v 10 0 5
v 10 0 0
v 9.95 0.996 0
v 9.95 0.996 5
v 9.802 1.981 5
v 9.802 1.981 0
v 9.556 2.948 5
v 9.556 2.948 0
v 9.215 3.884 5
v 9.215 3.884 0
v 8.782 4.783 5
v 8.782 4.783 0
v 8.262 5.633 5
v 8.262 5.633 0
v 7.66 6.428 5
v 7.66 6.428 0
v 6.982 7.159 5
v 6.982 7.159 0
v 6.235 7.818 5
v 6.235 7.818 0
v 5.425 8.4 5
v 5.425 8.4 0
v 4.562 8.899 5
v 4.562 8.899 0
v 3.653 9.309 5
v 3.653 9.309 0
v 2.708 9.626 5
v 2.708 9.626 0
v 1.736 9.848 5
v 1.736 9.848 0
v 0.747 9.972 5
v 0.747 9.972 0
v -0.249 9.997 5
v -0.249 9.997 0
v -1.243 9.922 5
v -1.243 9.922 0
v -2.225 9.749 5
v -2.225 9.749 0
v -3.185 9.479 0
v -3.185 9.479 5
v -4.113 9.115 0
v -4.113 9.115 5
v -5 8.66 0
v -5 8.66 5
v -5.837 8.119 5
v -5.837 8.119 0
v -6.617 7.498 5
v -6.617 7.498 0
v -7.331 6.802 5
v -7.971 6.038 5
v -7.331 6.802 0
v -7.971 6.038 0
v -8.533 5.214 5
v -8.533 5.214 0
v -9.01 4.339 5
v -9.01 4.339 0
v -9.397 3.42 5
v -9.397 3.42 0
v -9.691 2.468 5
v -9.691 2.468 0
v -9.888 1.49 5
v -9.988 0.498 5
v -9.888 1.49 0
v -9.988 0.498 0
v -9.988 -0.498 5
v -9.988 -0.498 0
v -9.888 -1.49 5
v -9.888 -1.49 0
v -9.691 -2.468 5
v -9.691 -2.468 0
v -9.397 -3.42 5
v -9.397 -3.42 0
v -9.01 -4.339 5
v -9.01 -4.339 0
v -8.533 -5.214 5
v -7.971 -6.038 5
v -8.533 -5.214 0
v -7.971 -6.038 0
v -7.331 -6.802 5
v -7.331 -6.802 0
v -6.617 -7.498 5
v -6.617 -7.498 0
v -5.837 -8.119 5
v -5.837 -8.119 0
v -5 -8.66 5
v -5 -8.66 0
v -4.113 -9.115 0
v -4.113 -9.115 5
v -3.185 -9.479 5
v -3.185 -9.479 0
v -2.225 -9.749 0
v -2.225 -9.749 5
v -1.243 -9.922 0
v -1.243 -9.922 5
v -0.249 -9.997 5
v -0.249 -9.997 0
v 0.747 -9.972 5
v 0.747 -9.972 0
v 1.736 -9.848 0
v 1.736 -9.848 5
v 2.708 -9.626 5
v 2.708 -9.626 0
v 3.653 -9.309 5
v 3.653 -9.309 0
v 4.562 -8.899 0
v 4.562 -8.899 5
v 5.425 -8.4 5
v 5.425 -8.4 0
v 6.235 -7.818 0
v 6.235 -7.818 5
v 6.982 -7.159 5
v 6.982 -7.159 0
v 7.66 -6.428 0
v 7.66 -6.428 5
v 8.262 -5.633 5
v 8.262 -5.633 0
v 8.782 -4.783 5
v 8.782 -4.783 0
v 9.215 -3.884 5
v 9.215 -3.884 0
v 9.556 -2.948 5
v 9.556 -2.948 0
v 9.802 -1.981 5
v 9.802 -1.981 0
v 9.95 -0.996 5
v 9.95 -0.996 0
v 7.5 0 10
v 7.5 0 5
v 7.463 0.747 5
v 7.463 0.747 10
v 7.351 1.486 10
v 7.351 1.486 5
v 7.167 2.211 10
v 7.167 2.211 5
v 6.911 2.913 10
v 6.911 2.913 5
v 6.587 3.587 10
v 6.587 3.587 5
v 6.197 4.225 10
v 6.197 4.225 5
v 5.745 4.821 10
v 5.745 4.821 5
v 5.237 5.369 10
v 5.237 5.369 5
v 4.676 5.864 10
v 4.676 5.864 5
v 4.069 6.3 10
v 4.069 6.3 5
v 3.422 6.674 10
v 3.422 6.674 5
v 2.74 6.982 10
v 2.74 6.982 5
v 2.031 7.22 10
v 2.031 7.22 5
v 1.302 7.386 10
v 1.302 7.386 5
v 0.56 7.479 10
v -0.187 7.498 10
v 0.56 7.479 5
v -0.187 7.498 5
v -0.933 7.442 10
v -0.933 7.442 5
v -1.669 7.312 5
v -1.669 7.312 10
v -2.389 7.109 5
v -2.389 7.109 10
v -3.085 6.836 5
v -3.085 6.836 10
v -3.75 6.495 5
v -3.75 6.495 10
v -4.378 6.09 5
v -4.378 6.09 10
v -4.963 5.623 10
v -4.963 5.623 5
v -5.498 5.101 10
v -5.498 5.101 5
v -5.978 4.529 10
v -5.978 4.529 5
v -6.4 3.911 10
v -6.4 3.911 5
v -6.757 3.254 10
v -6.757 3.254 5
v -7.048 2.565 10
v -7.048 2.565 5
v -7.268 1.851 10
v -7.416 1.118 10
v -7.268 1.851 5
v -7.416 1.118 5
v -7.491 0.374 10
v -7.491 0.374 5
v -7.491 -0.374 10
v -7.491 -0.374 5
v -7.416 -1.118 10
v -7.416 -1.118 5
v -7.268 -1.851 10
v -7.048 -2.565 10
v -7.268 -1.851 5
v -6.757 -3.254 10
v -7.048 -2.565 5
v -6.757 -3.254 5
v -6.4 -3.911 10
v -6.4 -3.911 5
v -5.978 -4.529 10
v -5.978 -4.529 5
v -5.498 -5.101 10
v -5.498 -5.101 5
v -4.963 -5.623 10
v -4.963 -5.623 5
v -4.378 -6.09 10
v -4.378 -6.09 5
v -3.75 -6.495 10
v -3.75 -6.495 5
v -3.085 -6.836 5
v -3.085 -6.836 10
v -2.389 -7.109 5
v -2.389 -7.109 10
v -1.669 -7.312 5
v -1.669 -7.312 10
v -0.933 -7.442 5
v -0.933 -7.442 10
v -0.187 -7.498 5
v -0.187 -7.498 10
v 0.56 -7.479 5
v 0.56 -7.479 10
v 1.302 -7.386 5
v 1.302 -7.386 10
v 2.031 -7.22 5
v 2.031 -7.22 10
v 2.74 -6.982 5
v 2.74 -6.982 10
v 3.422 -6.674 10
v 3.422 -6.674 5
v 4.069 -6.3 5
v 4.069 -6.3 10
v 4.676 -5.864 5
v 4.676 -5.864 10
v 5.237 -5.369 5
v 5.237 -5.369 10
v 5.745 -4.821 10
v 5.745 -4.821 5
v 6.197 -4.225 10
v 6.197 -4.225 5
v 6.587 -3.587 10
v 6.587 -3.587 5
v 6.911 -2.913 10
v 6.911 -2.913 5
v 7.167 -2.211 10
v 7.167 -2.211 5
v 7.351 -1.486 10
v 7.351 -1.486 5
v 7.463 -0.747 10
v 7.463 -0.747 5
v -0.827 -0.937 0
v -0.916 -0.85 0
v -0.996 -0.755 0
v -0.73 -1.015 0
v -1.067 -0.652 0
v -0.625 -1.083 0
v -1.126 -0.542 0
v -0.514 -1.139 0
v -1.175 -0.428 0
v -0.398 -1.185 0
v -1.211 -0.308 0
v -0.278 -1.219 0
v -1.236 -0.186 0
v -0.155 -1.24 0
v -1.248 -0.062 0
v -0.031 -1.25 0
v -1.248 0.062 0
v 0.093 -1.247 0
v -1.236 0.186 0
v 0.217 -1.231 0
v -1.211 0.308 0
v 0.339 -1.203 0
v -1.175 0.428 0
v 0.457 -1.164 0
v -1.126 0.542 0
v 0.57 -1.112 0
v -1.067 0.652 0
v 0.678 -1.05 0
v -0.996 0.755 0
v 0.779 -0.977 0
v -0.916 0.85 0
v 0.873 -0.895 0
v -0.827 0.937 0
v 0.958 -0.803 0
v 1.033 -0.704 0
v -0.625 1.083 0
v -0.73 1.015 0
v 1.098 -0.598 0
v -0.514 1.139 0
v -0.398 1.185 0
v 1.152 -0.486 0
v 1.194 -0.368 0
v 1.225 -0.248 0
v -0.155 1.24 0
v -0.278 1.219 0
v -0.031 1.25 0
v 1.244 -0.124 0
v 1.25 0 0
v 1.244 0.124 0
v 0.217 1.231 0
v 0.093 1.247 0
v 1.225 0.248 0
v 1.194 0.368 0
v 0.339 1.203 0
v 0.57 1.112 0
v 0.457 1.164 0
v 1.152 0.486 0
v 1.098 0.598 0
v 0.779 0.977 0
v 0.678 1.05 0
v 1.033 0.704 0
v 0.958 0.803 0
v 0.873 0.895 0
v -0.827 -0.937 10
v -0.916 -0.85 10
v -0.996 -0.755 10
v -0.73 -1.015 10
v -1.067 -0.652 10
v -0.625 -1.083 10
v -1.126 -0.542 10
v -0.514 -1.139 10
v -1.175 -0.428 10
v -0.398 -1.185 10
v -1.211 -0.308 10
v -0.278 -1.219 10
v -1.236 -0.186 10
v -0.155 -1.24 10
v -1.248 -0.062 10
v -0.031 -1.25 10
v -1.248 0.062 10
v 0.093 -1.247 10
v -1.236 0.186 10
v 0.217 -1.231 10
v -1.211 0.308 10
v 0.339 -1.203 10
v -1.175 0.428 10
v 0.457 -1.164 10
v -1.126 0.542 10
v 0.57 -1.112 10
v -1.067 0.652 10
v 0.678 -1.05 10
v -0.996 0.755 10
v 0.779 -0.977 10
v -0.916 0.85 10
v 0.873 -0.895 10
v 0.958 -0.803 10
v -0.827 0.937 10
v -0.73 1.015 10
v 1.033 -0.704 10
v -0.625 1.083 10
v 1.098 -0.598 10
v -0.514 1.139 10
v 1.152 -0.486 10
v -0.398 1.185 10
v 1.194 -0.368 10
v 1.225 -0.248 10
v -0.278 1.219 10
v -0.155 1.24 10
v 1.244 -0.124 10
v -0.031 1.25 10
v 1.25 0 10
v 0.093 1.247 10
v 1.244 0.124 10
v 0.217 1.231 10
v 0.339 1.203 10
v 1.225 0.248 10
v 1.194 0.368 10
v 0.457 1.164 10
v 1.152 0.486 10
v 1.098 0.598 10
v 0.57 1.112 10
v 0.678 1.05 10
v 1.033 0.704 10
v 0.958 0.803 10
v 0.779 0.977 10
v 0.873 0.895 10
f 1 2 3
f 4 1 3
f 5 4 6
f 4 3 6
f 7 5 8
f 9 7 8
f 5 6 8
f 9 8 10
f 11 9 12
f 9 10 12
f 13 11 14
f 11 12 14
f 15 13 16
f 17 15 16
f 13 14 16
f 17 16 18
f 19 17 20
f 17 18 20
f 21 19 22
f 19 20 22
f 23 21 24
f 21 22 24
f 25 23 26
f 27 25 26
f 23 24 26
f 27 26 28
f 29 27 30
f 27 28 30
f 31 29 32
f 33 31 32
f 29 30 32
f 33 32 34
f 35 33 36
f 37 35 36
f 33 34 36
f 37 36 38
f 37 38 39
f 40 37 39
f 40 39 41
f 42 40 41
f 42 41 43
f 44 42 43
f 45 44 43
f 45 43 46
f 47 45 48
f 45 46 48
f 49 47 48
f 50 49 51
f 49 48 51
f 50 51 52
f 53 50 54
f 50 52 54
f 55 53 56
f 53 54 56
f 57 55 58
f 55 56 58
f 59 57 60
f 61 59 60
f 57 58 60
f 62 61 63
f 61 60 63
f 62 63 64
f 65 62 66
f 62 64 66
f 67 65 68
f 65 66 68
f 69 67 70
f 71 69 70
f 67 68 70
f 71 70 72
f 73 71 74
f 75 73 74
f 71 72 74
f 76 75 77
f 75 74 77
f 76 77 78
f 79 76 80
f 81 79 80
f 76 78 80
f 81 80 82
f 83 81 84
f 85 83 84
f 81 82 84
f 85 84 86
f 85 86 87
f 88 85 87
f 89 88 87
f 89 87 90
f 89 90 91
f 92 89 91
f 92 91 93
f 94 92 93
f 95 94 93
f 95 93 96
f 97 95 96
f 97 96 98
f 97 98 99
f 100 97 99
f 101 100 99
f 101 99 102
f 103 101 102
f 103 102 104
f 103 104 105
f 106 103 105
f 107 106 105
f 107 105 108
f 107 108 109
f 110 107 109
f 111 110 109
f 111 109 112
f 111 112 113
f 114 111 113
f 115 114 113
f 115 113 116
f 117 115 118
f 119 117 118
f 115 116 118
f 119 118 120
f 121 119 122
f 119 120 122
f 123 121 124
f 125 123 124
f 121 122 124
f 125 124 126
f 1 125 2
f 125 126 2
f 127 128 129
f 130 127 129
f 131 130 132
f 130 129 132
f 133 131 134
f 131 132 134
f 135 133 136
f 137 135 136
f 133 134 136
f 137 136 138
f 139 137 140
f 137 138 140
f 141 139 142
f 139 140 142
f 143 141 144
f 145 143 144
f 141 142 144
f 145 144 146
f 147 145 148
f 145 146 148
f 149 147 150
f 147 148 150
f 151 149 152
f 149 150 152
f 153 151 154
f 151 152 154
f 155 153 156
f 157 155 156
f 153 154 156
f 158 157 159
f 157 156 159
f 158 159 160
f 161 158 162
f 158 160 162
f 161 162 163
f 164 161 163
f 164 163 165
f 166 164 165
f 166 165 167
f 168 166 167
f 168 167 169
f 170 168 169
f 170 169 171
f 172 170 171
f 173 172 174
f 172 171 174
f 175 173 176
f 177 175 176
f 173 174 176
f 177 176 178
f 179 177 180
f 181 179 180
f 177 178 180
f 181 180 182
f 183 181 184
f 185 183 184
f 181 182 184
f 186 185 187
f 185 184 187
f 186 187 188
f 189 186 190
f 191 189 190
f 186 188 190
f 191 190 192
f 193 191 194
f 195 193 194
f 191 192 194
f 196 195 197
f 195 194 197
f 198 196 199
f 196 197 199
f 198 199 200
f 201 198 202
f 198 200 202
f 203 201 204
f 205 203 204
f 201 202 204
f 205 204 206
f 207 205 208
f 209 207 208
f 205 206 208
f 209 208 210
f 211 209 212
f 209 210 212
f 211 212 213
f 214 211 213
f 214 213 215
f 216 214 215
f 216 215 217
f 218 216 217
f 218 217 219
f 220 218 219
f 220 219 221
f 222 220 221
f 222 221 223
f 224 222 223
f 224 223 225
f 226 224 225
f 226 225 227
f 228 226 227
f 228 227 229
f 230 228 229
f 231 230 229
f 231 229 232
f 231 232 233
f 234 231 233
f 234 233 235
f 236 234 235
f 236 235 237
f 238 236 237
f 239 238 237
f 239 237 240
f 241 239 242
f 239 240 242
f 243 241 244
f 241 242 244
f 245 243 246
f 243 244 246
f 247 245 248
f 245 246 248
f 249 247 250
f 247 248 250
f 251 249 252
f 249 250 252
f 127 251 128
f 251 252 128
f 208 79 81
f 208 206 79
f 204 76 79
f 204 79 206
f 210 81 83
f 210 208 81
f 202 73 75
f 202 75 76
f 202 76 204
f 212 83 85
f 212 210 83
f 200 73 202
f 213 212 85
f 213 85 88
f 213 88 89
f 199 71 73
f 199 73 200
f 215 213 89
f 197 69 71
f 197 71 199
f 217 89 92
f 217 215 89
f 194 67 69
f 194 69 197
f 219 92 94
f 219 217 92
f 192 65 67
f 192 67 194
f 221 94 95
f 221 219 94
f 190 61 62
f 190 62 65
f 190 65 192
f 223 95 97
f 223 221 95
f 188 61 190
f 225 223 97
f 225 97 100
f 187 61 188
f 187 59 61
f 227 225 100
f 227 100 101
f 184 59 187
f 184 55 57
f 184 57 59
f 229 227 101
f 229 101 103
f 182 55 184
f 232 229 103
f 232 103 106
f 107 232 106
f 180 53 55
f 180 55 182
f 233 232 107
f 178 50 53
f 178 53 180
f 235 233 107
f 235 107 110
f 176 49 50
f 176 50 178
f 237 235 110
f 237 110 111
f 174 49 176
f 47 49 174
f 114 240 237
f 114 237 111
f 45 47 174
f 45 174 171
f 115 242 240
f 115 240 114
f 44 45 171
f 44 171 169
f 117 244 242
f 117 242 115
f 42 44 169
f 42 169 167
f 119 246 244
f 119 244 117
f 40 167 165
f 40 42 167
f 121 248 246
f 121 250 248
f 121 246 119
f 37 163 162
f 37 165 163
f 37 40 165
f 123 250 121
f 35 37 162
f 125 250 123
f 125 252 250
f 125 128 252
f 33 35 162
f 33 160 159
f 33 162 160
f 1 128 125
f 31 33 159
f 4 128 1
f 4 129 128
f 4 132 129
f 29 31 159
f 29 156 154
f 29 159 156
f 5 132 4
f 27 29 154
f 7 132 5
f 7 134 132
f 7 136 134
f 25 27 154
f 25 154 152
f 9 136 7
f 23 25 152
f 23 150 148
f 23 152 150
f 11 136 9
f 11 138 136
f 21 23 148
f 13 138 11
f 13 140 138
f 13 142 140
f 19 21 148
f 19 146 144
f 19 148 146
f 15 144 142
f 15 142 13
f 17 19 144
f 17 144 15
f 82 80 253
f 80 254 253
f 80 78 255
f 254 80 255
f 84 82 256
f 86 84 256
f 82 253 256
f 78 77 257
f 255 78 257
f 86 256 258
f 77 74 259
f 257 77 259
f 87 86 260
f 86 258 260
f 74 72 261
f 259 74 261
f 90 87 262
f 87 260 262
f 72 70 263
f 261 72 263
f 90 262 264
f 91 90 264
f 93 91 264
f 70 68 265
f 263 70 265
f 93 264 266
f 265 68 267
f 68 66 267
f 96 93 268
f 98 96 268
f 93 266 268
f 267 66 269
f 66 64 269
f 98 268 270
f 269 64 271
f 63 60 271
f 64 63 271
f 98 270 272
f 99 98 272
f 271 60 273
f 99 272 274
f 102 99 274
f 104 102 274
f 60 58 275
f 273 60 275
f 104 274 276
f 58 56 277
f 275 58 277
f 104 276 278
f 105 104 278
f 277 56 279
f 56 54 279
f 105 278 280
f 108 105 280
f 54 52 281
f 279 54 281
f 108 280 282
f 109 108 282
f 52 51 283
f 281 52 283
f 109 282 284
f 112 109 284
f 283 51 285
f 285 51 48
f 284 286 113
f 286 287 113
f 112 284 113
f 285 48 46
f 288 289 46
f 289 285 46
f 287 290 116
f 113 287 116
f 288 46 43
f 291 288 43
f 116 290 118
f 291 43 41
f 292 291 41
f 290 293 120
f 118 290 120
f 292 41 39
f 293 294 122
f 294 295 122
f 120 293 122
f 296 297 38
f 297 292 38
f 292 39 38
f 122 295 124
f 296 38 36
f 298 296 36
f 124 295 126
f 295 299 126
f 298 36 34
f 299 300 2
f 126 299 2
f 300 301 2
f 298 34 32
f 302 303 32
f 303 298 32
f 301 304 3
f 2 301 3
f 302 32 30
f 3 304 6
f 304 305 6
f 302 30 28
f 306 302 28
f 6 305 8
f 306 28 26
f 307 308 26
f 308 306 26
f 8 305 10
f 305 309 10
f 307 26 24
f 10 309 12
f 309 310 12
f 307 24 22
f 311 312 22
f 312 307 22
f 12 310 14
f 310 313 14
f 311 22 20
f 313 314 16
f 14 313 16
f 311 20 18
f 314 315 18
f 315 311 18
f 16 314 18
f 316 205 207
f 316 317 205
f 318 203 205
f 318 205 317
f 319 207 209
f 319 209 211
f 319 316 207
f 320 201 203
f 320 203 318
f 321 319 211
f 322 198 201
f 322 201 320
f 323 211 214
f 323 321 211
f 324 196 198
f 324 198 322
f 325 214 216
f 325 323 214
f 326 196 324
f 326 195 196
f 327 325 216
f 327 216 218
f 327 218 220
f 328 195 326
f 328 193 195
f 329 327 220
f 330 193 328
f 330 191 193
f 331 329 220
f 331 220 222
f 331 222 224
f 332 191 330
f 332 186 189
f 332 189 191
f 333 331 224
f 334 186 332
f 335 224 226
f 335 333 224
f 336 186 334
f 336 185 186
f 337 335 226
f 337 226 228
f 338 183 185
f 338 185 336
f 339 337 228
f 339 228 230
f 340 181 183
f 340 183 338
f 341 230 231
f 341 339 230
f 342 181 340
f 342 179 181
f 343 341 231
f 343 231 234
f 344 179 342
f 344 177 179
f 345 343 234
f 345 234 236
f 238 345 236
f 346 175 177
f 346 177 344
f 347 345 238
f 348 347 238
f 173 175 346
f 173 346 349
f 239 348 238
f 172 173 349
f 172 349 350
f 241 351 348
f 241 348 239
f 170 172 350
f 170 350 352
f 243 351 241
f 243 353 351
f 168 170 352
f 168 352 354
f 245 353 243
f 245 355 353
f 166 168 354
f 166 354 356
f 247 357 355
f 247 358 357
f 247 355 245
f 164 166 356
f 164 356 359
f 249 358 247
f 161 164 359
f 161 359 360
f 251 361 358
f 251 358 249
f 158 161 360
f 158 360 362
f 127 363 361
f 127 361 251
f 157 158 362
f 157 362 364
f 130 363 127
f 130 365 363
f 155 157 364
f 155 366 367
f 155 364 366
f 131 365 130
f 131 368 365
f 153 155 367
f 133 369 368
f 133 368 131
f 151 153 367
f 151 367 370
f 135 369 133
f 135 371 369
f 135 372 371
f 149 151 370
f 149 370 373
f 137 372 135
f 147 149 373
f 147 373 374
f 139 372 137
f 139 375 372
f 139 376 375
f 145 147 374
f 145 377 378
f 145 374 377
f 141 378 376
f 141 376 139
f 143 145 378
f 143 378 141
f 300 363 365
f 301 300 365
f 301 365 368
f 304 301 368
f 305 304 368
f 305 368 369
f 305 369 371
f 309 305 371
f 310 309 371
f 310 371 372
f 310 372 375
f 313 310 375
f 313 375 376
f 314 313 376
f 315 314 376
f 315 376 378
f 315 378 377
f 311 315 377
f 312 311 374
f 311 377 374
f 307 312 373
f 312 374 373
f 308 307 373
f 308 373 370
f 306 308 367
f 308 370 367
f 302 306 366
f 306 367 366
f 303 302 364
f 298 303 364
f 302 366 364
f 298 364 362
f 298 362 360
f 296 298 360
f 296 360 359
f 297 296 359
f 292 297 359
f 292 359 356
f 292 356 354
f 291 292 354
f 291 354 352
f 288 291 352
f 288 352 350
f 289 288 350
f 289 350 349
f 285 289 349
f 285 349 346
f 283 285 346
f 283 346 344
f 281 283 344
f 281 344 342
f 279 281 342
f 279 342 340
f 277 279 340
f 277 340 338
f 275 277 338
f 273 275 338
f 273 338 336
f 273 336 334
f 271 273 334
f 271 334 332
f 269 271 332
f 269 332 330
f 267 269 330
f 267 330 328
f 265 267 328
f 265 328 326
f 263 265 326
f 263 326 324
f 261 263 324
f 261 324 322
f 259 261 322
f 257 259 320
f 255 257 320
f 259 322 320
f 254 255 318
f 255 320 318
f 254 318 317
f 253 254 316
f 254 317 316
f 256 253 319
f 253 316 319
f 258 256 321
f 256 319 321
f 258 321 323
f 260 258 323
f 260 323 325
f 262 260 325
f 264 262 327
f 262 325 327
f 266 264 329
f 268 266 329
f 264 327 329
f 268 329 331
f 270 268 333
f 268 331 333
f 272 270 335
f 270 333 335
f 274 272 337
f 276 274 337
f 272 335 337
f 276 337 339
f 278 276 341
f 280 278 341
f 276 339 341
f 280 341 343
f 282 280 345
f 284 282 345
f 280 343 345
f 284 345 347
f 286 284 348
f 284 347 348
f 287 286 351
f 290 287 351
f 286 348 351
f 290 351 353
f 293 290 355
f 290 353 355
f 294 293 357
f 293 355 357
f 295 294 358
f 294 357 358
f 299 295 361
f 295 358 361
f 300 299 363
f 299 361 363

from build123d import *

# Parameters (mm, degrees)
F0_R     = 10
F0_R_2   = 7.5
F1_DEPTH = 5
F2_R     = 7.5
F3_DEPTH = 5
F4_R     = 1.25
F5_DEPTH = 25.4


with BuildPart() as f1:
    # F0 (on Top) → F1 (new body)
    with BuildSketch(Plane.XY):
        Circle(F0_R)
        Circle(F0_R_2, mode=Mode.SUBTRACT)
        Circle(F0_R_2)
    extrude(amount=F1_DEPTH)

    # F2 (on face) → F3 (join)
    with BuildSketch(Plane.XY.offset(5)):
        Circle(F2_R)
    extrude(amount=F3_DEPTH)

    # F4 (on face) → F5 (cut)
    with BuildSketch(Plane.XY.offset(10)):
        Circle(F4_R)
    extrude(amount=-F5_DEPTH, mode=Mode.SUBTRACT)


solid = f1.part
